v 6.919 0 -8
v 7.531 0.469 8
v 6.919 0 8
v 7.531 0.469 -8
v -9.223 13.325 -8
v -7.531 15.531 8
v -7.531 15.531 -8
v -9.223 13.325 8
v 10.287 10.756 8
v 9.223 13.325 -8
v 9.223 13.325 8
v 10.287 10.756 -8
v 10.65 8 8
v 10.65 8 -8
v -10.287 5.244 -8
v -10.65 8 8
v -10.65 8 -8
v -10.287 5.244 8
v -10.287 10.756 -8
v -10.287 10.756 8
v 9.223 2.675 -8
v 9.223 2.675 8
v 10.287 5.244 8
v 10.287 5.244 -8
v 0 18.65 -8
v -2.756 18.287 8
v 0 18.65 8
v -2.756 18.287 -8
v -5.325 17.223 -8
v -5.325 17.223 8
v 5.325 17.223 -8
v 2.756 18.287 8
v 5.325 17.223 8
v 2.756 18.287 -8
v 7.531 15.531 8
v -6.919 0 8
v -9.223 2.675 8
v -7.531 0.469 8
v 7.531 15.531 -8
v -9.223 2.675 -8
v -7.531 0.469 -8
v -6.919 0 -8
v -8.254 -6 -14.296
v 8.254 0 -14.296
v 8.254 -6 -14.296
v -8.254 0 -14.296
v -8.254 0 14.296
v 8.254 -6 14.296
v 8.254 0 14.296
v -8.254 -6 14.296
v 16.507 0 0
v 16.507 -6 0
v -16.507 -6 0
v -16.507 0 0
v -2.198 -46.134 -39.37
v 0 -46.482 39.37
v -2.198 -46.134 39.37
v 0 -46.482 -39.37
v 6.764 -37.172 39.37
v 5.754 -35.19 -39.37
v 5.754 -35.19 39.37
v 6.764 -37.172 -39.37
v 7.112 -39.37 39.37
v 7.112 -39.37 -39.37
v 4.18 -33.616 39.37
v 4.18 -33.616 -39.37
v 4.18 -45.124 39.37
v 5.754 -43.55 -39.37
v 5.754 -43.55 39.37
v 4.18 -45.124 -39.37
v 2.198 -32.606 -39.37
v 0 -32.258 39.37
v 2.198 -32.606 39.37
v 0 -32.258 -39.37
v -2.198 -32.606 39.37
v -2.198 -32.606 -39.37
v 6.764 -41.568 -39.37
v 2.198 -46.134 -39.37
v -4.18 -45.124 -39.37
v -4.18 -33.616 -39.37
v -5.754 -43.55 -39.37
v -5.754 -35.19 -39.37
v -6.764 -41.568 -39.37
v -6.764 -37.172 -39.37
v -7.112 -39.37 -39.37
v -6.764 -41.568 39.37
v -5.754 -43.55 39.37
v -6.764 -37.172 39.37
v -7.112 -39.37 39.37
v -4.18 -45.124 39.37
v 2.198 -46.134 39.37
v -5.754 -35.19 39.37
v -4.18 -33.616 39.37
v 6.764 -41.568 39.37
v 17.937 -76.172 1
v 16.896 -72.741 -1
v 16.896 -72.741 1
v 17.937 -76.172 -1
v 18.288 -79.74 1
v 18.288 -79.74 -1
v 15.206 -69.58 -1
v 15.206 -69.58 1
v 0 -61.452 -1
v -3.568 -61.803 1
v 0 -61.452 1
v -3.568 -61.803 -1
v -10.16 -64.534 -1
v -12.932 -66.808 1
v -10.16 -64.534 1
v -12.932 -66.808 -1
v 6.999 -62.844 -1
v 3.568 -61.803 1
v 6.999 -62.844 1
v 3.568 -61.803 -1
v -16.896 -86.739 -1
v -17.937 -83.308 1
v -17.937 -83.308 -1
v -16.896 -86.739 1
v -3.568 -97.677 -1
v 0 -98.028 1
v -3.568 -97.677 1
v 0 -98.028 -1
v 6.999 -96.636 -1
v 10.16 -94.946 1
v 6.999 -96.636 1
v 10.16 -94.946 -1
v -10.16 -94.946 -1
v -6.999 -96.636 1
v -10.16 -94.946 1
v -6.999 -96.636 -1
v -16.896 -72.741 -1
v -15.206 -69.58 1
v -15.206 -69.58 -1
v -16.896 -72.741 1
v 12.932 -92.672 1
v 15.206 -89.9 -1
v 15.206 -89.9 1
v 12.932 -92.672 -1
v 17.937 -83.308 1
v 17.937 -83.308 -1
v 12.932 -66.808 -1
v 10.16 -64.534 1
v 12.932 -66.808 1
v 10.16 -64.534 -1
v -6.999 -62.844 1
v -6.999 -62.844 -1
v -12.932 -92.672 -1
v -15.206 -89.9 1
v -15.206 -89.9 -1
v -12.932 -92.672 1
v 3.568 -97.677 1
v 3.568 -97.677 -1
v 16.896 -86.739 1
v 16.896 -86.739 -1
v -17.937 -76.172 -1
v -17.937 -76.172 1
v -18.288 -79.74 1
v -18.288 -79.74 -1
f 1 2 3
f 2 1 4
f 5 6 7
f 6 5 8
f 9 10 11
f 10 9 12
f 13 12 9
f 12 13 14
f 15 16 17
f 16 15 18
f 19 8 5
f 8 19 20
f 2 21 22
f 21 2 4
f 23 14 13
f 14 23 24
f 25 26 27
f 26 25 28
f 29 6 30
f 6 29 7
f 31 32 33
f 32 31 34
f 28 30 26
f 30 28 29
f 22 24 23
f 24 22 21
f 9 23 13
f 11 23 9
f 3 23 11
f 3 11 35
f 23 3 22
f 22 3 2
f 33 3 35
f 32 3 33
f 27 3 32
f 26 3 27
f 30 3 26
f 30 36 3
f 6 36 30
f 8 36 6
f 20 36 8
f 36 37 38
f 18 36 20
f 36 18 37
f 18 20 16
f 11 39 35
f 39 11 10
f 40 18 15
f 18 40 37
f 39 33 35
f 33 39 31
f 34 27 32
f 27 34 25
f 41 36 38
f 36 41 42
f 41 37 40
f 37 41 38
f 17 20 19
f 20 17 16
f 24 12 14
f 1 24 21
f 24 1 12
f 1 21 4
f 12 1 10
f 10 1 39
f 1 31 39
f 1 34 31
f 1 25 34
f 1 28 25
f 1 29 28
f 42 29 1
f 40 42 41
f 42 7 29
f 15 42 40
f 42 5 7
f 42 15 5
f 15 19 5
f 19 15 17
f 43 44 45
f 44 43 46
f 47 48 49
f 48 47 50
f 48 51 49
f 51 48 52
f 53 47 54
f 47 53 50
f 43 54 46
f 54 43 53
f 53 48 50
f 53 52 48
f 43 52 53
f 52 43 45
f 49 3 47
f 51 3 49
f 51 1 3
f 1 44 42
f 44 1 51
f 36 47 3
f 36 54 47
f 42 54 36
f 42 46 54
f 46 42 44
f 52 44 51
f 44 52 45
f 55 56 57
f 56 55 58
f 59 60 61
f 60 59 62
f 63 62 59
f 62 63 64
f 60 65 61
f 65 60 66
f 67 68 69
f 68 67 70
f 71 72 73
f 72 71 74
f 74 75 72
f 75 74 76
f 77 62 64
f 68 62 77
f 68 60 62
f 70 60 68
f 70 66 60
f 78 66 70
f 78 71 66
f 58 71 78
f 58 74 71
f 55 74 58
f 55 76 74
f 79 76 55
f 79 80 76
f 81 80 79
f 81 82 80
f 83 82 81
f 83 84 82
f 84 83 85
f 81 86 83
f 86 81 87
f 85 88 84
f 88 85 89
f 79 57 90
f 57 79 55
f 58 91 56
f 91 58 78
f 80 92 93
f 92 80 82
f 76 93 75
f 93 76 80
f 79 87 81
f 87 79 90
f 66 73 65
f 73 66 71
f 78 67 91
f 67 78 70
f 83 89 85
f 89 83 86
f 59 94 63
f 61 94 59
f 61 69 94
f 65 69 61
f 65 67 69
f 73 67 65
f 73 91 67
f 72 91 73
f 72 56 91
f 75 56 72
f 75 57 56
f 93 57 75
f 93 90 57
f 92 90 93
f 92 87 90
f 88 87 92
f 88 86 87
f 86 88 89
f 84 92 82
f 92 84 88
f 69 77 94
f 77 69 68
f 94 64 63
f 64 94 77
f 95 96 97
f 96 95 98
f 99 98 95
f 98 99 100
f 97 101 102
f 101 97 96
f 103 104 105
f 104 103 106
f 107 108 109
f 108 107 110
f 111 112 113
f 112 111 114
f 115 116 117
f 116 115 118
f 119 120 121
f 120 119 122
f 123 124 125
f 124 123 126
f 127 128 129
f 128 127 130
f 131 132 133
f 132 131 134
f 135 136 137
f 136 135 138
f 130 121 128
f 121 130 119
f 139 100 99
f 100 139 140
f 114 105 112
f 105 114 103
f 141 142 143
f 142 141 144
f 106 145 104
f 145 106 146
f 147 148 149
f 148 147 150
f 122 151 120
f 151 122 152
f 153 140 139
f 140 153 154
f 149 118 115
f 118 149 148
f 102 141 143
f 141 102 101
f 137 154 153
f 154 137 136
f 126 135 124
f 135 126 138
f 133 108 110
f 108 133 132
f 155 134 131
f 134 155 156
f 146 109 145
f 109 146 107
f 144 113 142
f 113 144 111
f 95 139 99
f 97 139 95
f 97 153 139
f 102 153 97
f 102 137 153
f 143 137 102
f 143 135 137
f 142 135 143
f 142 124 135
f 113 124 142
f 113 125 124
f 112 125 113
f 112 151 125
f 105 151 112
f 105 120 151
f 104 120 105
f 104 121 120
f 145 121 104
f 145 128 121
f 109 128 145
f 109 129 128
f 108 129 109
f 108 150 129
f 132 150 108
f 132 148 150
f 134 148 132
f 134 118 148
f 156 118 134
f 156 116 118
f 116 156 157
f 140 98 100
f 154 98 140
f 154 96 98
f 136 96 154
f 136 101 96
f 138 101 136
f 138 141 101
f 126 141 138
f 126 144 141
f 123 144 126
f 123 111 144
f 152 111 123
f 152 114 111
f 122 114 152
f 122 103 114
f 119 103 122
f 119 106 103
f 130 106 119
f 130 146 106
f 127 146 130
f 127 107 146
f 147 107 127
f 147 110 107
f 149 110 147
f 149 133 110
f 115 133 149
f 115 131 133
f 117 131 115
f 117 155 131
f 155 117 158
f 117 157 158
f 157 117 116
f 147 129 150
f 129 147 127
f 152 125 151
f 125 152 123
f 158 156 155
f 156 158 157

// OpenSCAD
// Auto-generated by scripts/author_from_manifest.py (Phase D.3).
// Source: data/phase_d_manifest.json (sku_intent='tyco-ty8226-esfr-pendent-k224-214f').
// Do not hand-edit — regenerate from the manifest.
//
// @part tyco_ty8226_esfr_pendent_k224_214f
// @kind sprinkler_head
// @category head.pendant.k224
// @display-name "Tyco TY8226 ESFR Pendent K22.4 214°F"
// @mfg tyco_fire_protection
// @mfg-pn TY8226
// @listing UL FM
// @hazard-classes ESFR
// @price-usd 78.00
// @install-minutes 14
// @crew journeyman
// @k-factor 22.4
// @orientation pendant
// @response quick
// @temperature 214F
// @param size_in number default=0.5 label="Size" unit="in"
// @port inlet position=[0,0.014,0] direction=[0,1,0] style=NPT_threaded size_in=1 role=drop

size_in = 0.5;
k_factor = 22.4;

length_mm   = 78.74;
body_dia_mm = 40.64;
thread_od   = 21.3;
thread_len  = 16;
deflector_d = body_dia_mm * 0.9;

 union() {
    translate([0, thread_len/2, 0])
        cylinder(h = thread_len, d = thread_od, center = true, $fn = 24);
    translate([0, -3, 0])
        rotate([90, 0, 0])
        cylinder(h = 6, d = thread_od * 1.55, $fn = 6, center = true);
    translate([0, -length_mm/2, 0])
        cylinder(h = length_mm, d = body_dia_mm * 0.35, center = true, $fn = 20);
    translate([0, -length_mm - 1, 0])
        cylinder(h = 2, d = deflector_d, center = true, $fn = 32);
}
